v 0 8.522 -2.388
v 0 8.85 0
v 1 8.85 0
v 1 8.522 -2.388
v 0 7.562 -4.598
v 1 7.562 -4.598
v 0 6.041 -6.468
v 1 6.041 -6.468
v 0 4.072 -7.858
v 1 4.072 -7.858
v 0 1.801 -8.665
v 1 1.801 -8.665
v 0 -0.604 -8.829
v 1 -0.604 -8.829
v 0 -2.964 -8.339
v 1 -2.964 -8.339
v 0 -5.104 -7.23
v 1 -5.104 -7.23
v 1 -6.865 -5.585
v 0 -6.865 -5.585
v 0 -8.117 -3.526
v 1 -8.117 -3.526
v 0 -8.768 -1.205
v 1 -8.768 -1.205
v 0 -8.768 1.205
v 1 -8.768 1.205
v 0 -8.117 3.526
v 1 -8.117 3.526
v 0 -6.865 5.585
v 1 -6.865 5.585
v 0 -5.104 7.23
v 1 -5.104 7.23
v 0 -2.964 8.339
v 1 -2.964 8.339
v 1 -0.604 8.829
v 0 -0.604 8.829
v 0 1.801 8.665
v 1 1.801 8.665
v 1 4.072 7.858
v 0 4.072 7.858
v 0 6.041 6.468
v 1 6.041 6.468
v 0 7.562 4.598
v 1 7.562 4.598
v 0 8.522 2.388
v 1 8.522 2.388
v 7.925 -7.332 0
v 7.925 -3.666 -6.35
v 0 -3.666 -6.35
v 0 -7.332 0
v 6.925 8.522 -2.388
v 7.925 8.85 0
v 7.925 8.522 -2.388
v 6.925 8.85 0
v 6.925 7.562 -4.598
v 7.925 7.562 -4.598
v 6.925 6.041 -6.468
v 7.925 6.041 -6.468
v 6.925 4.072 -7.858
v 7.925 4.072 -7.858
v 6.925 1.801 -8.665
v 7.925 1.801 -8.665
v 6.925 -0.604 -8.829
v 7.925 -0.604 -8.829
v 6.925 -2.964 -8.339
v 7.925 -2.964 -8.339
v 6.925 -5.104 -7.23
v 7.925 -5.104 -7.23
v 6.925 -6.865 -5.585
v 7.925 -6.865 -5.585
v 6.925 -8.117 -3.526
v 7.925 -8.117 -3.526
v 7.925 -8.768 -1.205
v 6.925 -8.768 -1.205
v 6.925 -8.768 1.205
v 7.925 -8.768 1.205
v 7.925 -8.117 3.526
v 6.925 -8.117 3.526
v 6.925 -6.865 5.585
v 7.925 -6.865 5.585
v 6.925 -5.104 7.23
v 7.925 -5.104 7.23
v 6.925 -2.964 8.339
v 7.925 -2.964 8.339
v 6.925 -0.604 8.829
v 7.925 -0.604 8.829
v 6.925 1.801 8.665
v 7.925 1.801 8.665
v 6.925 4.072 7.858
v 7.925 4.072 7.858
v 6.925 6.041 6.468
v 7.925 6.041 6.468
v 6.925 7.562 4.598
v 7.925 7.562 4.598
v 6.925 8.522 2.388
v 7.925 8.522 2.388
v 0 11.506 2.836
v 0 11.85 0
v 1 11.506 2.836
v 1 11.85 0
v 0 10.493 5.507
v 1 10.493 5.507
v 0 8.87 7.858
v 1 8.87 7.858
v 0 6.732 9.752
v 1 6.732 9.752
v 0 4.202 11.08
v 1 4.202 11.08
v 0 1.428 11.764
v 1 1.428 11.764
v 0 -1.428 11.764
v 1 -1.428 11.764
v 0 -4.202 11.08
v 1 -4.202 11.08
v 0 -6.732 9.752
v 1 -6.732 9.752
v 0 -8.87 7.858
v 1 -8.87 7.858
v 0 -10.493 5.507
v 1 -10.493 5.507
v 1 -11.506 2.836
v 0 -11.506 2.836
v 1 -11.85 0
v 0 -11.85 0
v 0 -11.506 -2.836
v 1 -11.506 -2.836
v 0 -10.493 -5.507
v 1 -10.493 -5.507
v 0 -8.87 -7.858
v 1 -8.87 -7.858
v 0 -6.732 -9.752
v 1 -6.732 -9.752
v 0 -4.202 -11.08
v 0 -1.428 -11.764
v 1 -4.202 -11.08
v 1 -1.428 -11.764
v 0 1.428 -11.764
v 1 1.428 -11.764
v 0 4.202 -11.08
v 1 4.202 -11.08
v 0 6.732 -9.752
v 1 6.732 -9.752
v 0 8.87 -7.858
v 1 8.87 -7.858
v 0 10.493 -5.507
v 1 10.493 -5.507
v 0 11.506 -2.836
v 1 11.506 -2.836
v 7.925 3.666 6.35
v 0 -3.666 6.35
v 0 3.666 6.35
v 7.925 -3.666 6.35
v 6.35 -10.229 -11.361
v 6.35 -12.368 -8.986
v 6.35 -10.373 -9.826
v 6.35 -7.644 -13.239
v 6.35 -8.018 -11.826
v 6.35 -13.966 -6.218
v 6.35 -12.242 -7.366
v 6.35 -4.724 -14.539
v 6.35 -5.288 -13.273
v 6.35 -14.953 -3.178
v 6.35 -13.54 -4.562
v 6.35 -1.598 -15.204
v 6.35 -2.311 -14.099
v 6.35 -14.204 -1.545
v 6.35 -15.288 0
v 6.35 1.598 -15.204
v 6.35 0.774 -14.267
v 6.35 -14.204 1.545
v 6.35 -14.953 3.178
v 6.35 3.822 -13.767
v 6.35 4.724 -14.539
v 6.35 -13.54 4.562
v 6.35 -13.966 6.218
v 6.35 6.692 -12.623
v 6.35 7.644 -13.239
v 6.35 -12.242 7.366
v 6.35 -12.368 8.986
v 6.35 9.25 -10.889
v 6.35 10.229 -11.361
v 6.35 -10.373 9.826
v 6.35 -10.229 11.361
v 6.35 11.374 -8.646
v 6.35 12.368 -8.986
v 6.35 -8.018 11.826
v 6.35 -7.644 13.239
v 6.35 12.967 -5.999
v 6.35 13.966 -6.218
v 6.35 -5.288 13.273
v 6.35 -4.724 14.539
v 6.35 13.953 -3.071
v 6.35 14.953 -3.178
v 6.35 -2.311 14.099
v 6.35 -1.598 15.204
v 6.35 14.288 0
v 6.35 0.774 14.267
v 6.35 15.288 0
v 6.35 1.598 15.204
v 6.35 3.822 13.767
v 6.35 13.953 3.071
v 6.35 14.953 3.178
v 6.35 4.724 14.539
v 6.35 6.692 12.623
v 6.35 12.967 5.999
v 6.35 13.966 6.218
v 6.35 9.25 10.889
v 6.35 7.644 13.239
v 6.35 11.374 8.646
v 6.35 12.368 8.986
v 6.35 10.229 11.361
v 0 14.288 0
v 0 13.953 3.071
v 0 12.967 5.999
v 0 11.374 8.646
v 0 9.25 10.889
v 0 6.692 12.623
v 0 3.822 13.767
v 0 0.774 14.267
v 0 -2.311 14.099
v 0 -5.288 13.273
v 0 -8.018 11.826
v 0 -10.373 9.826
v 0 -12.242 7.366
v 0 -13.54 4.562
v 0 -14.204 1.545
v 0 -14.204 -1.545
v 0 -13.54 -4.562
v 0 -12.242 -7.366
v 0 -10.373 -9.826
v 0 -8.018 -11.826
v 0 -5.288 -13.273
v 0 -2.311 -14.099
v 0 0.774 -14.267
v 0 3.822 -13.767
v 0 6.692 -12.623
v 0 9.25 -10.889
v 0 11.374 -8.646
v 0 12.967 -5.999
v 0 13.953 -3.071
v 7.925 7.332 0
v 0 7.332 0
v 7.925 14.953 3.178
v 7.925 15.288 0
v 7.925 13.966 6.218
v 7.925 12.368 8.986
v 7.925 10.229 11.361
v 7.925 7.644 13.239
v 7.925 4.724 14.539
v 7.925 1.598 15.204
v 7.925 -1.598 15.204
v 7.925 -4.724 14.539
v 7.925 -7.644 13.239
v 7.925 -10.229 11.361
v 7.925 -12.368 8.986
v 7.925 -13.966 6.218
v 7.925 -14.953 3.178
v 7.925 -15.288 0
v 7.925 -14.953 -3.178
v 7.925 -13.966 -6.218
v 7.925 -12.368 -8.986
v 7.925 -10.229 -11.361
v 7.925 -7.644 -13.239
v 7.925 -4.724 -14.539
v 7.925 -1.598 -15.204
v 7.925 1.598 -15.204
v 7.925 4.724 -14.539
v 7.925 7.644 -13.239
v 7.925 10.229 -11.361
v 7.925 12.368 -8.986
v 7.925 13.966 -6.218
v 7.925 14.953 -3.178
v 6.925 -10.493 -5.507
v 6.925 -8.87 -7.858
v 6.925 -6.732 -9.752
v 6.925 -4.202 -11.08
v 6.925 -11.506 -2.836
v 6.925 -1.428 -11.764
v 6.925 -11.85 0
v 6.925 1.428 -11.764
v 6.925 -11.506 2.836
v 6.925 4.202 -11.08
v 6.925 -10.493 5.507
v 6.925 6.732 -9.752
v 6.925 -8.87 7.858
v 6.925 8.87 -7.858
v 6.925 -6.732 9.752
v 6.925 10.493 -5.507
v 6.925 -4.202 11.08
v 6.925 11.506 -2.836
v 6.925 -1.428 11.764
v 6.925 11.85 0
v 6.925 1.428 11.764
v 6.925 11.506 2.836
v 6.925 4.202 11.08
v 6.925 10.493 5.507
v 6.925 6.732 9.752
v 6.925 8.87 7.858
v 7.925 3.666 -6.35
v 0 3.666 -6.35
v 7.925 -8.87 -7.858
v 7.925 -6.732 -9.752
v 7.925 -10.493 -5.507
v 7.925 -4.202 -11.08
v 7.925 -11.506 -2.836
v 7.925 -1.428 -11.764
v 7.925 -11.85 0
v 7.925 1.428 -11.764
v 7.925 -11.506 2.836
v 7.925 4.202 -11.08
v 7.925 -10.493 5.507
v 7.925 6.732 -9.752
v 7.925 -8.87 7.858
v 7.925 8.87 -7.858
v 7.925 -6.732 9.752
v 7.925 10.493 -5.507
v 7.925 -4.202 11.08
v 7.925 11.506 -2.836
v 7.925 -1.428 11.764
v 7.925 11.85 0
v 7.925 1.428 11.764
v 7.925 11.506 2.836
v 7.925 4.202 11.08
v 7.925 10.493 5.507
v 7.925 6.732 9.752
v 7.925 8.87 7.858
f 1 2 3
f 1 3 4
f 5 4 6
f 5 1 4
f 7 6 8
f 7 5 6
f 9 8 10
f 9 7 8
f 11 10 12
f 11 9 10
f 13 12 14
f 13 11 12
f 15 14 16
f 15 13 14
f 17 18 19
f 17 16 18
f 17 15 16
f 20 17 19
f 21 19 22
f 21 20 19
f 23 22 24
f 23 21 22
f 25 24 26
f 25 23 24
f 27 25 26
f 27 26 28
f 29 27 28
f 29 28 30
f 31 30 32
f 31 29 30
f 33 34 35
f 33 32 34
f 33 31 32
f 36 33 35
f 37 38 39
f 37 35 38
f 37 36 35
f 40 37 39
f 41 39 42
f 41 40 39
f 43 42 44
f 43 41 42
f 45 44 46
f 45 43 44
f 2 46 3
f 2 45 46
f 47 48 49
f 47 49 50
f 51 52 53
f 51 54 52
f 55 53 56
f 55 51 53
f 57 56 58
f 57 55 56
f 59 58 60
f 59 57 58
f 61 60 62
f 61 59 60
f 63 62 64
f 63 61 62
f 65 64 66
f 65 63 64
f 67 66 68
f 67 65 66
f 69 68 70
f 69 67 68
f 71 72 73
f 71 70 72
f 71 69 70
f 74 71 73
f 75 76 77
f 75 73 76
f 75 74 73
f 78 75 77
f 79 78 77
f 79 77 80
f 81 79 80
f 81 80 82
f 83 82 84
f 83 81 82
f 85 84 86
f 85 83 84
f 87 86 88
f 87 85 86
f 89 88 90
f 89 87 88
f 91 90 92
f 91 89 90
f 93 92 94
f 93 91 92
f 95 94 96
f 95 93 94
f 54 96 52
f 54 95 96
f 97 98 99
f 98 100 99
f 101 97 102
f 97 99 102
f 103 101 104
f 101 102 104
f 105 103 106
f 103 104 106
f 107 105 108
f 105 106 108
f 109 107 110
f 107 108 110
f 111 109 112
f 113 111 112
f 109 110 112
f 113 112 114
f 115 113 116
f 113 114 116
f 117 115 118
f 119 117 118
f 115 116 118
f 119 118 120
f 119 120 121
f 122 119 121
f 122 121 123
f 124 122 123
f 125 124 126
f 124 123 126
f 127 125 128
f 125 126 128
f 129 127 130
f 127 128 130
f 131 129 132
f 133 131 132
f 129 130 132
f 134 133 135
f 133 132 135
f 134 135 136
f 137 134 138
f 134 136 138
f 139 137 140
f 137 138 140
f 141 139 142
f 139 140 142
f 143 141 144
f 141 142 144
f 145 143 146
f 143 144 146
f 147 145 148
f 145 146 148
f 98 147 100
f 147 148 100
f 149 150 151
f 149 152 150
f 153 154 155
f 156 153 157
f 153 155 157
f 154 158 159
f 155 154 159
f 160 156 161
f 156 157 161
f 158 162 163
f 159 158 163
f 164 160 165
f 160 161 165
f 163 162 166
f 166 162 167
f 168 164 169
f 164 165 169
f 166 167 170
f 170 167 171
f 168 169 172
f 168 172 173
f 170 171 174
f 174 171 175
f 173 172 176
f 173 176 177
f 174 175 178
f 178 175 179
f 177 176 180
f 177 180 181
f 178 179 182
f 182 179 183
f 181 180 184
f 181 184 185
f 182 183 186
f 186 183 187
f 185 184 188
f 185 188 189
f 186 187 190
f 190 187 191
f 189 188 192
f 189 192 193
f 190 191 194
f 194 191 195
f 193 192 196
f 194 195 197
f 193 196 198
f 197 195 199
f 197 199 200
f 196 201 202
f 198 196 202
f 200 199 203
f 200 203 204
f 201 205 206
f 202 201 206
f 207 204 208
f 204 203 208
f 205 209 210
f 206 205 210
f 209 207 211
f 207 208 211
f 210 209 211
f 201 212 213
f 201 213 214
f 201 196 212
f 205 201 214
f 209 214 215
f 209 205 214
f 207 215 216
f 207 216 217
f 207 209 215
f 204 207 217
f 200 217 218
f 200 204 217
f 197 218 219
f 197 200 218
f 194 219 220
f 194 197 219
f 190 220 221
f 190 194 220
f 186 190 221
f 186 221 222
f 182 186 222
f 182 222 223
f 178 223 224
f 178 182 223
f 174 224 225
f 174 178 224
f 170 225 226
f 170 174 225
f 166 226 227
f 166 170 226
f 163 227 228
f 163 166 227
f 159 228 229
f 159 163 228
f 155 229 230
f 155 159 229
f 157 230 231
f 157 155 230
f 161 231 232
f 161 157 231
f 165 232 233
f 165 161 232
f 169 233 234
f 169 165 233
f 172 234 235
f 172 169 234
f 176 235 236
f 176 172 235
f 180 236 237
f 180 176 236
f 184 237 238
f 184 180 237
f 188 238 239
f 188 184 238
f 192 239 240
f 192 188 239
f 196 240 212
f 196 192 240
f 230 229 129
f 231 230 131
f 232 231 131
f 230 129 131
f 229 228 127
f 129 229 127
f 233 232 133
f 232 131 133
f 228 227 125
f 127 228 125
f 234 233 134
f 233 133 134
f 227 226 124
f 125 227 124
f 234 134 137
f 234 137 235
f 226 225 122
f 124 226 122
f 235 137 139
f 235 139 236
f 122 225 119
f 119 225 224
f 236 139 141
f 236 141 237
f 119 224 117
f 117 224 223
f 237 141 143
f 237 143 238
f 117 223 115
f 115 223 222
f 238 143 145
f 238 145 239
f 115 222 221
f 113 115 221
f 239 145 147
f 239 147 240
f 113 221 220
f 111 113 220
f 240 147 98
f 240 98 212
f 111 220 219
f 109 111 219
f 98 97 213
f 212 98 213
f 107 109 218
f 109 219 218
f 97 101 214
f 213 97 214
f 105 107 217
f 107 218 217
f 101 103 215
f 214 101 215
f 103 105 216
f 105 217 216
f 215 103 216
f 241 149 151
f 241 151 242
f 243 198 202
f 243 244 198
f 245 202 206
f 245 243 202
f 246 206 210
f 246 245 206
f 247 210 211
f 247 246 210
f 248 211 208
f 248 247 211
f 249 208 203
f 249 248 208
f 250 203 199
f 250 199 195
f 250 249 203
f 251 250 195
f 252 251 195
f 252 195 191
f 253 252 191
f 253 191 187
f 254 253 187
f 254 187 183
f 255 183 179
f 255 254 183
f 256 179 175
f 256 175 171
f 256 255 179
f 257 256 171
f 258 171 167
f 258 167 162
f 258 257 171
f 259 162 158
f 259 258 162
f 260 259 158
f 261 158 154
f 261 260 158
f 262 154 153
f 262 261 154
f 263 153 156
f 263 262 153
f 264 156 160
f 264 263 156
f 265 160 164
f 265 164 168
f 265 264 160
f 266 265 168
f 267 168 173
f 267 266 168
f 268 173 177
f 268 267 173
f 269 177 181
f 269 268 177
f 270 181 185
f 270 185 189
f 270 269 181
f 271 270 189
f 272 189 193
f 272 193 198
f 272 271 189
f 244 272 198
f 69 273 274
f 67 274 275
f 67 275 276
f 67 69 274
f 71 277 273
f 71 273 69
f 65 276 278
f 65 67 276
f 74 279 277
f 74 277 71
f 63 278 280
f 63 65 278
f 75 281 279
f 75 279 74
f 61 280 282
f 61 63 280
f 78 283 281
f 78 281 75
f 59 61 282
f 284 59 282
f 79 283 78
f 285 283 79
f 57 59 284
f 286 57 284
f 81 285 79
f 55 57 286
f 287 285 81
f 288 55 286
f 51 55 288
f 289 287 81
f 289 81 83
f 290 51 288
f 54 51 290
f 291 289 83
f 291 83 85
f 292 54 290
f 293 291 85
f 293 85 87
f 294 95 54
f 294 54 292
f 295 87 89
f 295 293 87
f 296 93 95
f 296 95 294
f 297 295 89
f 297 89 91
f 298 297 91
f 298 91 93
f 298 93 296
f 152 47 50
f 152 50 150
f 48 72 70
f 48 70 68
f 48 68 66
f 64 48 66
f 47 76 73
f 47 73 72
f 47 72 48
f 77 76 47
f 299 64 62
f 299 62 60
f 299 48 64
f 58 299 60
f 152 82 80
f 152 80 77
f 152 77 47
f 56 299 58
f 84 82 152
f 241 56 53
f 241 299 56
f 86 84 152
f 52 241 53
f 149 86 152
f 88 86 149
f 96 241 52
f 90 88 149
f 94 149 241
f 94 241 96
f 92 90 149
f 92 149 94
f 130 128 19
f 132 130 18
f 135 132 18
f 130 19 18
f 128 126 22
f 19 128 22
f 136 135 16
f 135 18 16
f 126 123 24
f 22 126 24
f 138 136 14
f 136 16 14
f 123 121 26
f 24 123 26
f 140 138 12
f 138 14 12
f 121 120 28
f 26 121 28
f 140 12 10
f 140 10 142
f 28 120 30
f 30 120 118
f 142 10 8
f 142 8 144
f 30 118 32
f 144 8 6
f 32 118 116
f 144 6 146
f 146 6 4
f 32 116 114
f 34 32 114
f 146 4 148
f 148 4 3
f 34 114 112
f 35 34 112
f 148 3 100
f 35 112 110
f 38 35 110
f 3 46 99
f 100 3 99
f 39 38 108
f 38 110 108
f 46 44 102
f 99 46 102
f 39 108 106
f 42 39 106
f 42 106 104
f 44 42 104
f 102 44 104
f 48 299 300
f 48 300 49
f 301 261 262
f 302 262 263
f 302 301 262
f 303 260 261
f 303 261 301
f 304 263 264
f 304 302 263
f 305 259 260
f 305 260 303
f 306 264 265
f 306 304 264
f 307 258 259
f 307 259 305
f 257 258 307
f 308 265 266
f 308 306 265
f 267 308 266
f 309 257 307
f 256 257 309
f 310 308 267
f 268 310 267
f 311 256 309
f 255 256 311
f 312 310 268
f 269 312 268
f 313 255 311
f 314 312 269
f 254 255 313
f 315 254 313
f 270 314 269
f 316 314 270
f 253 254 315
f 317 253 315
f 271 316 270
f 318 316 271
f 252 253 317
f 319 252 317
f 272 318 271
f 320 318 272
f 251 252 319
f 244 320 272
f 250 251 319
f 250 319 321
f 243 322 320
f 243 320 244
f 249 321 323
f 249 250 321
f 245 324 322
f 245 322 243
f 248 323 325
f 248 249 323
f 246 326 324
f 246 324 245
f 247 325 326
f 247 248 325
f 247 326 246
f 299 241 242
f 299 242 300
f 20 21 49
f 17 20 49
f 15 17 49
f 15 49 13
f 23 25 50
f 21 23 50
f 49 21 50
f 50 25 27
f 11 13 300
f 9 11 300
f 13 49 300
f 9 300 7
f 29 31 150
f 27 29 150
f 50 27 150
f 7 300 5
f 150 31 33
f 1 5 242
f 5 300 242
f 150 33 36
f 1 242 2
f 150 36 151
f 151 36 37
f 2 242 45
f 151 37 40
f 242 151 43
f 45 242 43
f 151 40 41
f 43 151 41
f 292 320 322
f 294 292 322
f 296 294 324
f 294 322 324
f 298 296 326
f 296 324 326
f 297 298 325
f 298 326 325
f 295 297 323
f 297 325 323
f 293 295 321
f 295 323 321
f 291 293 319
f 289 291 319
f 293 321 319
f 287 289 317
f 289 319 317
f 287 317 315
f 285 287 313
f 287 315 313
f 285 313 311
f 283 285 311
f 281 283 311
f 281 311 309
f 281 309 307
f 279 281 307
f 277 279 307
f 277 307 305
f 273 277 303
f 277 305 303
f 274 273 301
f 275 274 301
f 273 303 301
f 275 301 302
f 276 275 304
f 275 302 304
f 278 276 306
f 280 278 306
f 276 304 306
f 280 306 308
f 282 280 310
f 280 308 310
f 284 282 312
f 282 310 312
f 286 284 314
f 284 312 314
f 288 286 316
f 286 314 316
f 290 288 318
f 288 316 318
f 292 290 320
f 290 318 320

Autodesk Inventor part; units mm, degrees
ref_plane "YZ Plane" through (0, 0, 0) normal (1, 0, 0) x (0, 1, 0)
ref_plane "XZ Plane" through (0, 0, 0) normal (0, 1, 0) x (-1, 0, 0)
ref_plane "XY Plane" through (0, 0, 0) normal (0, 0, 1) x (1, 0, 0)
sketch "Sketch1" plane through (0, 0, 0) normal (0, 0, 1) x (1, 0, 0)
  line L0 (0, 14.2875) -> (6.35, 14.2875)
  line L1 (6.35, 14.2875) -> (6.35, 15.2875)
  line L2 (6.35, 15.2875) -> (7.9248, 15.2875)
  line L3 (7.9248, 15.2875) -> (7.9248, 6.35)
  line L4 (7.9248, 6.35) -> (0, 6.35)
  line L5 (0, 6.35) -> (0, 14.2875)
  line L6 (0, 0) -> (7.9248, 0)
  line L7 (0, 11.85) -> (1, 11.85)
  line L8 (1, 11.85) -> (1, 8.85)
  line L9 (1, 8.85) -> (0, 8.85)
  line L10 (0, 8.85) -> (0, 11.85)
  line L11 (7.9248, 8.85) -> (6.9248, 8.85)
  line L12 (6.9248, 8.85) -> (6.9248, 11.85)
  line L13 (6.9248, 11.85) -> (7.9248, 11.85)
  line L14 (7.9248, 11.85) -> (7.9248, 8.85)
  dimension "d0" = 7.9248
  dimension "d2" = 12.7
  dimension "d3" = 28.575
  dimension "d4" = 1.5748
  dimension "d5" = 1
  dimension "d7" = 1
  dimension "d8" = 3
  dimension "d9" = 2.5
revolve "Revolution1" add sketch "Sketch1" angle 360 about axis through (0, 0, 0) along (1, 0, 0) contours L0 L1 L2 L3 L13 L12 L11 L4 L5 L9 L8 L7
sketch "Sketch2" plane through (7.9248, 0, 0) normal (1, 0, 0) x (0, 0, -1)
  circle A0 centre (0, 0) radius 8.85 projected
  circle A1 centre (0, 0) radius 6.35 projected
  line L0 (0, 7.3323) -> (6.35, 3.6662)
  line L1 (6.35, 3.6662) -> (6.35, -3.6662)
  line L2 (6.35, -3.6662) -> (0, -7.3323)
  line L3 (0, -7.3323) -> (-6.35, -3.6662)
  line L4 (-6.35, -3.6662) -> (-6.35, 3.6662)
  line L5 (-6.35, 3.6662) -> (0, 7.3323)
extrude "Extrusion1" cut sketch "Sketch2" against normal through all contours L1 L2 A1 | A1 L0 L1 | A1 L5 L0 | L2 L3 A1 | A1 L4 L5 | L3 L4 A1
properties part number "RoundBearing-1-2-inch"
